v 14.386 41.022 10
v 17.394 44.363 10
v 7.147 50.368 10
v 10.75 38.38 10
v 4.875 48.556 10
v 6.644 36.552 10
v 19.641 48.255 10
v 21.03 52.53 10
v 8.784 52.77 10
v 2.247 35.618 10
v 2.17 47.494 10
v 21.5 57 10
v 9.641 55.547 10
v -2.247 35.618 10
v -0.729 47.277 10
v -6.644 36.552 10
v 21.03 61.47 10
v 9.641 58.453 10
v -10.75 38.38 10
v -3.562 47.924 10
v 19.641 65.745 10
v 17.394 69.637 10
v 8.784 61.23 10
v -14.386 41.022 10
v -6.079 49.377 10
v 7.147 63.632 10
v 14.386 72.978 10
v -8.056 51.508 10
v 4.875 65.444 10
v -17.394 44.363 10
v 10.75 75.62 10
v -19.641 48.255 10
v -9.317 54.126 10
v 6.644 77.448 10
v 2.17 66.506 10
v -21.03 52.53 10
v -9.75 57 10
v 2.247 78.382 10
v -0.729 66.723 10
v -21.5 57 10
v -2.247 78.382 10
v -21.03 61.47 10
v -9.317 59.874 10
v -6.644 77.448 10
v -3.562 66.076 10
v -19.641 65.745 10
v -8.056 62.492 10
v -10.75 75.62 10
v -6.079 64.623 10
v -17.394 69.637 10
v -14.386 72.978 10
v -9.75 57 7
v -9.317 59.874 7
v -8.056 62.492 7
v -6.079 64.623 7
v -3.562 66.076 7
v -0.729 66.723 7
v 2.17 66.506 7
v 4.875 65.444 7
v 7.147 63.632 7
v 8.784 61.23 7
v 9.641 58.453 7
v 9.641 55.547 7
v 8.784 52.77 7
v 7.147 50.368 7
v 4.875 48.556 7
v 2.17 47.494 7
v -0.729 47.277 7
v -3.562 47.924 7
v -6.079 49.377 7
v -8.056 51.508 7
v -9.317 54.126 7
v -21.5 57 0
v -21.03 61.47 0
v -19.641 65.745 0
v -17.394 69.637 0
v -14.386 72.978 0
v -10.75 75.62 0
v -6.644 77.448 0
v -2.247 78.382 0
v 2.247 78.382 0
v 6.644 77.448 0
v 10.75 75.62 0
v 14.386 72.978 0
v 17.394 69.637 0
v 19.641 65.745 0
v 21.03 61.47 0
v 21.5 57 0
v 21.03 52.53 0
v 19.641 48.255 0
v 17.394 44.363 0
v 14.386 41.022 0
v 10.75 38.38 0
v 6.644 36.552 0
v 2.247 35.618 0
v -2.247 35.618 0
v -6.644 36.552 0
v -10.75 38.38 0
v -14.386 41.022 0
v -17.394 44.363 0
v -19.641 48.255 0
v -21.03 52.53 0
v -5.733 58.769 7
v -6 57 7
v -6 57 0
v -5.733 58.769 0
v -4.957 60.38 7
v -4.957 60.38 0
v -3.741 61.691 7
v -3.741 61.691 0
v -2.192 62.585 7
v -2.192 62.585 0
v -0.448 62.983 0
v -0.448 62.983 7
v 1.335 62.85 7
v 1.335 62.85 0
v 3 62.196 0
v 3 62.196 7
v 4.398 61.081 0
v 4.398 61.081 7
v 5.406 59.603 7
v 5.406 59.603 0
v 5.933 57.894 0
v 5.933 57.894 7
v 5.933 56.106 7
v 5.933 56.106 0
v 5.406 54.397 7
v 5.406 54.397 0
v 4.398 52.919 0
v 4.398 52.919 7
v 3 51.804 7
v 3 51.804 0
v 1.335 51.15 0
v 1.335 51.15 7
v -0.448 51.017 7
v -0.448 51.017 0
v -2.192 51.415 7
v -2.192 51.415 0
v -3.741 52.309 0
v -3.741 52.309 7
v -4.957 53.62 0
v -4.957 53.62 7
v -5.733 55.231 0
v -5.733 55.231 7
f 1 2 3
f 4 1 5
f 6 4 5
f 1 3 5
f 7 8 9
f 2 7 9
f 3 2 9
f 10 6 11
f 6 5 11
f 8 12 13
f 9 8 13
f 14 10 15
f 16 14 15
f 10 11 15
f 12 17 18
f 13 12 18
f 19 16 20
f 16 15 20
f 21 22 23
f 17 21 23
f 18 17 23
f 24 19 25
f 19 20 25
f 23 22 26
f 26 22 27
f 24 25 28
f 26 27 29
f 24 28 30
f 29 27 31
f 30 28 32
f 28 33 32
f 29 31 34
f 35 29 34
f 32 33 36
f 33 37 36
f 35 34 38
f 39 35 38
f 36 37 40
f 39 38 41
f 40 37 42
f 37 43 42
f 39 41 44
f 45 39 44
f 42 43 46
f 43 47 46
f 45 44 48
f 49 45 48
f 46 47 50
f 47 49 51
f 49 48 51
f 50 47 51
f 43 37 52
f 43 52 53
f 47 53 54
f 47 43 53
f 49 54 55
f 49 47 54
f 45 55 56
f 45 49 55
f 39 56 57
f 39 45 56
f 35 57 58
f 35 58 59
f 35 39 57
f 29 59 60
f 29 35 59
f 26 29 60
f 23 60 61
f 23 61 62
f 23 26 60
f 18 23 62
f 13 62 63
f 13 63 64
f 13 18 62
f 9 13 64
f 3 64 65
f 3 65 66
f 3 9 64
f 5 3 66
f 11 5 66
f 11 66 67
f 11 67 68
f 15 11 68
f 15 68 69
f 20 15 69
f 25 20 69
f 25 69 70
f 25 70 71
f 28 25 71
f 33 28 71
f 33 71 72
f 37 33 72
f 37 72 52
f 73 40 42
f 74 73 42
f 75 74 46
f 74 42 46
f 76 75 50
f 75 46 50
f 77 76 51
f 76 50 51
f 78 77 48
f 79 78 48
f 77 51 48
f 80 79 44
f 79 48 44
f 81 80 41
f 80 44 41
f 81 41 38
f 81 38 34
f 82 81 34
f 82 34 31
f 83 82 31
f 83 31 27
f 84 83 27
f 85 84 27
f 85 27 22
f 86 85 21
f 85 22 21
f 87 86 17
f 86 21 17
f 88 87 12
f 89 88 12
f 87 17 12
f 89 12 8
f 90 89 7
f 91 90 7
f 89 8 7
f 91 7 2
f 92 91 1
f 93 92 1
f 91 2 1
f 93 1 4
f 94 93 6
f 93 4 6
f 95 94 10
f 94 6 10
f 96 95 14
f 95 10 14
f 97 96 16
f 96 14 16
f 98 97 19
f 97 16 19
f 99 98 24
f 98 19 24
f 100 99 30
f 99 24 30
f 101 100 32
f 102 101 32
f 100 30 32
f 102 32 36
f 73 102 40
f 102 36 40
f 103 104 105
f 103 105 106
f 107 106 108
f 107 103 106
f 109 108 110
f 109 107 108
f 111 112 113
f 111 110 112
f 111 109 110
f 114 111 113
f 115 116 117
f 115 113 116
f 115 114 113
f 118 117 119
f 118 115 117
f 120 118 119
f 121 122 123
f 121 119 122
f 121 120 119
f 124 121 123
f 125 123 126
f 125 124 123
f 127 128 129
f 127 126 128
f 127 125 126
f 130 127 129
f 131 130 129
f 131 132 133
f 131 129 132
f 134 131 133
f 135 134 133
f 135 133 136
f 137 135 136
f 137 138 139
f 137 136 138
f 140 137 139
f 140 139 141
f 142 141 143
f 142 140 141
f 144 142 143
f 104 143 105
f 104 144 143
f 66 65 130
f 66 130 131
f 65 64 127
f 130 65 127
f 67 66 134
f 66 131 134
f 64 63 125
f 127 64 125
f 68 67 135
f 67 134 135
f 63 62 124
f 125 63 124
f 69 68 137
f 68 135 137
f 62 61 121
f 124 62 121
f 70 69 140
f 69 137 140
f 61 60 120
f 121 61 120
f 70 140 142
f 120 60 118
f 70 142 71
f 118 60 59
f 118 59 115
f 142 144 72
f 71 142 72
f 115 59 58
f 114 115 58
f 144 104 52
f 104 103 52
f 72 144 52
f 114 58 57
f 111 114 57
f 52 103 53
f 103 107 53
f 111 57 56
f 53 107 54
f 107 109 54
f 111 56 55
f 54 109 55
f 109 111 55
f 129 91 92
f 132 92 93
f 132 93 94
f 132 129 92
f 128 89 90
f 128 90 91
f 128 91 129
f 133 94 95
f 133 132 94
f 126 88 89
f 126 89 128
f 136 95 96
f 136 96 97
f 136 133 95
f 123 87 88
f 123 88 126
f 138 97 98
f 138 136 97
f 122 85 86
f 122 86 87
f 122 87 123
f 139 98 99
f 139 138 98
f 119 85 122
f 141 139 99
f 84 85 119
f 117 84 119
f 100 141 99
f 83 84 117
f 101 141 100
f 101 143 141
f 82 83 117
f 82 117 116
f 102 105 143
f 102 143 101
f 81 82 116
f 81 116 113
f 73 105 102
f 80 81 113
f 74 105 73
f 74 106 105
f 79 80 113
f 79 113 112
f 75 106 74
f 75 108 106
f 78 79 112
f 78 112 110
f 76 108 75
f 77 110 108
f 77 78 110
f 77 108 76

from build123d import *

# Parameters (mm, degrees)
CYLINDER005_R          = 6
CYLINDER005_DEPTH      = 20
CYLINDER007_R          = 9.75
CYLINDER007_DEPTH      = 6
CYLINDER003_R          = 21.5
CYLINDER003_DEPTH      = 10
CUT003_PLACEMENT_ANGLE = 180


with BuildPart() as cylinder005:
    # Cylinder005 → Cylinder005 (new body)
    with BuildSketch(Plane.XY):
        Circle(CYLINDER005_R)
    extrude(amount=CYLINDER005_DEPTH)


with BuildPart() as cylinder007:
    # Cylinder007 → Cylinder007 (new body)
    with BuildSketch(Plane.XY):
        Circle(CYLINDER007_R)
    extrude(amount=CYLINDER007_DEPTH)


with BuildPart() as large_bearing_ring:
    # Cylinder003 → Cylinder003 (new body)
    with BuildSketch(Plane.XY.offset(3)):
        Circle(CYLINDER003_R)
    extrude(amount=CYLINDER003_DEPTH)

    # Cut002: cut Cylinder007
    add(cylinder007.part, mode=Mode.SUBTRACT)

    # Cut003: cut Cylinder005
    add(cylinder005.part, mode=Mode.SUBTRACT)


with BuildPart() as large_bearing_ring_1:
    # Cut003 placement: moved
    add(large_bearing_ring.part.moved(Location((0, 57, 13))).rotate(Axis((0, 57, 13), (0, 1, 0)), CUT003_PLACEMENT_ANGLE))


solid = large_bearing_ring_1.part
